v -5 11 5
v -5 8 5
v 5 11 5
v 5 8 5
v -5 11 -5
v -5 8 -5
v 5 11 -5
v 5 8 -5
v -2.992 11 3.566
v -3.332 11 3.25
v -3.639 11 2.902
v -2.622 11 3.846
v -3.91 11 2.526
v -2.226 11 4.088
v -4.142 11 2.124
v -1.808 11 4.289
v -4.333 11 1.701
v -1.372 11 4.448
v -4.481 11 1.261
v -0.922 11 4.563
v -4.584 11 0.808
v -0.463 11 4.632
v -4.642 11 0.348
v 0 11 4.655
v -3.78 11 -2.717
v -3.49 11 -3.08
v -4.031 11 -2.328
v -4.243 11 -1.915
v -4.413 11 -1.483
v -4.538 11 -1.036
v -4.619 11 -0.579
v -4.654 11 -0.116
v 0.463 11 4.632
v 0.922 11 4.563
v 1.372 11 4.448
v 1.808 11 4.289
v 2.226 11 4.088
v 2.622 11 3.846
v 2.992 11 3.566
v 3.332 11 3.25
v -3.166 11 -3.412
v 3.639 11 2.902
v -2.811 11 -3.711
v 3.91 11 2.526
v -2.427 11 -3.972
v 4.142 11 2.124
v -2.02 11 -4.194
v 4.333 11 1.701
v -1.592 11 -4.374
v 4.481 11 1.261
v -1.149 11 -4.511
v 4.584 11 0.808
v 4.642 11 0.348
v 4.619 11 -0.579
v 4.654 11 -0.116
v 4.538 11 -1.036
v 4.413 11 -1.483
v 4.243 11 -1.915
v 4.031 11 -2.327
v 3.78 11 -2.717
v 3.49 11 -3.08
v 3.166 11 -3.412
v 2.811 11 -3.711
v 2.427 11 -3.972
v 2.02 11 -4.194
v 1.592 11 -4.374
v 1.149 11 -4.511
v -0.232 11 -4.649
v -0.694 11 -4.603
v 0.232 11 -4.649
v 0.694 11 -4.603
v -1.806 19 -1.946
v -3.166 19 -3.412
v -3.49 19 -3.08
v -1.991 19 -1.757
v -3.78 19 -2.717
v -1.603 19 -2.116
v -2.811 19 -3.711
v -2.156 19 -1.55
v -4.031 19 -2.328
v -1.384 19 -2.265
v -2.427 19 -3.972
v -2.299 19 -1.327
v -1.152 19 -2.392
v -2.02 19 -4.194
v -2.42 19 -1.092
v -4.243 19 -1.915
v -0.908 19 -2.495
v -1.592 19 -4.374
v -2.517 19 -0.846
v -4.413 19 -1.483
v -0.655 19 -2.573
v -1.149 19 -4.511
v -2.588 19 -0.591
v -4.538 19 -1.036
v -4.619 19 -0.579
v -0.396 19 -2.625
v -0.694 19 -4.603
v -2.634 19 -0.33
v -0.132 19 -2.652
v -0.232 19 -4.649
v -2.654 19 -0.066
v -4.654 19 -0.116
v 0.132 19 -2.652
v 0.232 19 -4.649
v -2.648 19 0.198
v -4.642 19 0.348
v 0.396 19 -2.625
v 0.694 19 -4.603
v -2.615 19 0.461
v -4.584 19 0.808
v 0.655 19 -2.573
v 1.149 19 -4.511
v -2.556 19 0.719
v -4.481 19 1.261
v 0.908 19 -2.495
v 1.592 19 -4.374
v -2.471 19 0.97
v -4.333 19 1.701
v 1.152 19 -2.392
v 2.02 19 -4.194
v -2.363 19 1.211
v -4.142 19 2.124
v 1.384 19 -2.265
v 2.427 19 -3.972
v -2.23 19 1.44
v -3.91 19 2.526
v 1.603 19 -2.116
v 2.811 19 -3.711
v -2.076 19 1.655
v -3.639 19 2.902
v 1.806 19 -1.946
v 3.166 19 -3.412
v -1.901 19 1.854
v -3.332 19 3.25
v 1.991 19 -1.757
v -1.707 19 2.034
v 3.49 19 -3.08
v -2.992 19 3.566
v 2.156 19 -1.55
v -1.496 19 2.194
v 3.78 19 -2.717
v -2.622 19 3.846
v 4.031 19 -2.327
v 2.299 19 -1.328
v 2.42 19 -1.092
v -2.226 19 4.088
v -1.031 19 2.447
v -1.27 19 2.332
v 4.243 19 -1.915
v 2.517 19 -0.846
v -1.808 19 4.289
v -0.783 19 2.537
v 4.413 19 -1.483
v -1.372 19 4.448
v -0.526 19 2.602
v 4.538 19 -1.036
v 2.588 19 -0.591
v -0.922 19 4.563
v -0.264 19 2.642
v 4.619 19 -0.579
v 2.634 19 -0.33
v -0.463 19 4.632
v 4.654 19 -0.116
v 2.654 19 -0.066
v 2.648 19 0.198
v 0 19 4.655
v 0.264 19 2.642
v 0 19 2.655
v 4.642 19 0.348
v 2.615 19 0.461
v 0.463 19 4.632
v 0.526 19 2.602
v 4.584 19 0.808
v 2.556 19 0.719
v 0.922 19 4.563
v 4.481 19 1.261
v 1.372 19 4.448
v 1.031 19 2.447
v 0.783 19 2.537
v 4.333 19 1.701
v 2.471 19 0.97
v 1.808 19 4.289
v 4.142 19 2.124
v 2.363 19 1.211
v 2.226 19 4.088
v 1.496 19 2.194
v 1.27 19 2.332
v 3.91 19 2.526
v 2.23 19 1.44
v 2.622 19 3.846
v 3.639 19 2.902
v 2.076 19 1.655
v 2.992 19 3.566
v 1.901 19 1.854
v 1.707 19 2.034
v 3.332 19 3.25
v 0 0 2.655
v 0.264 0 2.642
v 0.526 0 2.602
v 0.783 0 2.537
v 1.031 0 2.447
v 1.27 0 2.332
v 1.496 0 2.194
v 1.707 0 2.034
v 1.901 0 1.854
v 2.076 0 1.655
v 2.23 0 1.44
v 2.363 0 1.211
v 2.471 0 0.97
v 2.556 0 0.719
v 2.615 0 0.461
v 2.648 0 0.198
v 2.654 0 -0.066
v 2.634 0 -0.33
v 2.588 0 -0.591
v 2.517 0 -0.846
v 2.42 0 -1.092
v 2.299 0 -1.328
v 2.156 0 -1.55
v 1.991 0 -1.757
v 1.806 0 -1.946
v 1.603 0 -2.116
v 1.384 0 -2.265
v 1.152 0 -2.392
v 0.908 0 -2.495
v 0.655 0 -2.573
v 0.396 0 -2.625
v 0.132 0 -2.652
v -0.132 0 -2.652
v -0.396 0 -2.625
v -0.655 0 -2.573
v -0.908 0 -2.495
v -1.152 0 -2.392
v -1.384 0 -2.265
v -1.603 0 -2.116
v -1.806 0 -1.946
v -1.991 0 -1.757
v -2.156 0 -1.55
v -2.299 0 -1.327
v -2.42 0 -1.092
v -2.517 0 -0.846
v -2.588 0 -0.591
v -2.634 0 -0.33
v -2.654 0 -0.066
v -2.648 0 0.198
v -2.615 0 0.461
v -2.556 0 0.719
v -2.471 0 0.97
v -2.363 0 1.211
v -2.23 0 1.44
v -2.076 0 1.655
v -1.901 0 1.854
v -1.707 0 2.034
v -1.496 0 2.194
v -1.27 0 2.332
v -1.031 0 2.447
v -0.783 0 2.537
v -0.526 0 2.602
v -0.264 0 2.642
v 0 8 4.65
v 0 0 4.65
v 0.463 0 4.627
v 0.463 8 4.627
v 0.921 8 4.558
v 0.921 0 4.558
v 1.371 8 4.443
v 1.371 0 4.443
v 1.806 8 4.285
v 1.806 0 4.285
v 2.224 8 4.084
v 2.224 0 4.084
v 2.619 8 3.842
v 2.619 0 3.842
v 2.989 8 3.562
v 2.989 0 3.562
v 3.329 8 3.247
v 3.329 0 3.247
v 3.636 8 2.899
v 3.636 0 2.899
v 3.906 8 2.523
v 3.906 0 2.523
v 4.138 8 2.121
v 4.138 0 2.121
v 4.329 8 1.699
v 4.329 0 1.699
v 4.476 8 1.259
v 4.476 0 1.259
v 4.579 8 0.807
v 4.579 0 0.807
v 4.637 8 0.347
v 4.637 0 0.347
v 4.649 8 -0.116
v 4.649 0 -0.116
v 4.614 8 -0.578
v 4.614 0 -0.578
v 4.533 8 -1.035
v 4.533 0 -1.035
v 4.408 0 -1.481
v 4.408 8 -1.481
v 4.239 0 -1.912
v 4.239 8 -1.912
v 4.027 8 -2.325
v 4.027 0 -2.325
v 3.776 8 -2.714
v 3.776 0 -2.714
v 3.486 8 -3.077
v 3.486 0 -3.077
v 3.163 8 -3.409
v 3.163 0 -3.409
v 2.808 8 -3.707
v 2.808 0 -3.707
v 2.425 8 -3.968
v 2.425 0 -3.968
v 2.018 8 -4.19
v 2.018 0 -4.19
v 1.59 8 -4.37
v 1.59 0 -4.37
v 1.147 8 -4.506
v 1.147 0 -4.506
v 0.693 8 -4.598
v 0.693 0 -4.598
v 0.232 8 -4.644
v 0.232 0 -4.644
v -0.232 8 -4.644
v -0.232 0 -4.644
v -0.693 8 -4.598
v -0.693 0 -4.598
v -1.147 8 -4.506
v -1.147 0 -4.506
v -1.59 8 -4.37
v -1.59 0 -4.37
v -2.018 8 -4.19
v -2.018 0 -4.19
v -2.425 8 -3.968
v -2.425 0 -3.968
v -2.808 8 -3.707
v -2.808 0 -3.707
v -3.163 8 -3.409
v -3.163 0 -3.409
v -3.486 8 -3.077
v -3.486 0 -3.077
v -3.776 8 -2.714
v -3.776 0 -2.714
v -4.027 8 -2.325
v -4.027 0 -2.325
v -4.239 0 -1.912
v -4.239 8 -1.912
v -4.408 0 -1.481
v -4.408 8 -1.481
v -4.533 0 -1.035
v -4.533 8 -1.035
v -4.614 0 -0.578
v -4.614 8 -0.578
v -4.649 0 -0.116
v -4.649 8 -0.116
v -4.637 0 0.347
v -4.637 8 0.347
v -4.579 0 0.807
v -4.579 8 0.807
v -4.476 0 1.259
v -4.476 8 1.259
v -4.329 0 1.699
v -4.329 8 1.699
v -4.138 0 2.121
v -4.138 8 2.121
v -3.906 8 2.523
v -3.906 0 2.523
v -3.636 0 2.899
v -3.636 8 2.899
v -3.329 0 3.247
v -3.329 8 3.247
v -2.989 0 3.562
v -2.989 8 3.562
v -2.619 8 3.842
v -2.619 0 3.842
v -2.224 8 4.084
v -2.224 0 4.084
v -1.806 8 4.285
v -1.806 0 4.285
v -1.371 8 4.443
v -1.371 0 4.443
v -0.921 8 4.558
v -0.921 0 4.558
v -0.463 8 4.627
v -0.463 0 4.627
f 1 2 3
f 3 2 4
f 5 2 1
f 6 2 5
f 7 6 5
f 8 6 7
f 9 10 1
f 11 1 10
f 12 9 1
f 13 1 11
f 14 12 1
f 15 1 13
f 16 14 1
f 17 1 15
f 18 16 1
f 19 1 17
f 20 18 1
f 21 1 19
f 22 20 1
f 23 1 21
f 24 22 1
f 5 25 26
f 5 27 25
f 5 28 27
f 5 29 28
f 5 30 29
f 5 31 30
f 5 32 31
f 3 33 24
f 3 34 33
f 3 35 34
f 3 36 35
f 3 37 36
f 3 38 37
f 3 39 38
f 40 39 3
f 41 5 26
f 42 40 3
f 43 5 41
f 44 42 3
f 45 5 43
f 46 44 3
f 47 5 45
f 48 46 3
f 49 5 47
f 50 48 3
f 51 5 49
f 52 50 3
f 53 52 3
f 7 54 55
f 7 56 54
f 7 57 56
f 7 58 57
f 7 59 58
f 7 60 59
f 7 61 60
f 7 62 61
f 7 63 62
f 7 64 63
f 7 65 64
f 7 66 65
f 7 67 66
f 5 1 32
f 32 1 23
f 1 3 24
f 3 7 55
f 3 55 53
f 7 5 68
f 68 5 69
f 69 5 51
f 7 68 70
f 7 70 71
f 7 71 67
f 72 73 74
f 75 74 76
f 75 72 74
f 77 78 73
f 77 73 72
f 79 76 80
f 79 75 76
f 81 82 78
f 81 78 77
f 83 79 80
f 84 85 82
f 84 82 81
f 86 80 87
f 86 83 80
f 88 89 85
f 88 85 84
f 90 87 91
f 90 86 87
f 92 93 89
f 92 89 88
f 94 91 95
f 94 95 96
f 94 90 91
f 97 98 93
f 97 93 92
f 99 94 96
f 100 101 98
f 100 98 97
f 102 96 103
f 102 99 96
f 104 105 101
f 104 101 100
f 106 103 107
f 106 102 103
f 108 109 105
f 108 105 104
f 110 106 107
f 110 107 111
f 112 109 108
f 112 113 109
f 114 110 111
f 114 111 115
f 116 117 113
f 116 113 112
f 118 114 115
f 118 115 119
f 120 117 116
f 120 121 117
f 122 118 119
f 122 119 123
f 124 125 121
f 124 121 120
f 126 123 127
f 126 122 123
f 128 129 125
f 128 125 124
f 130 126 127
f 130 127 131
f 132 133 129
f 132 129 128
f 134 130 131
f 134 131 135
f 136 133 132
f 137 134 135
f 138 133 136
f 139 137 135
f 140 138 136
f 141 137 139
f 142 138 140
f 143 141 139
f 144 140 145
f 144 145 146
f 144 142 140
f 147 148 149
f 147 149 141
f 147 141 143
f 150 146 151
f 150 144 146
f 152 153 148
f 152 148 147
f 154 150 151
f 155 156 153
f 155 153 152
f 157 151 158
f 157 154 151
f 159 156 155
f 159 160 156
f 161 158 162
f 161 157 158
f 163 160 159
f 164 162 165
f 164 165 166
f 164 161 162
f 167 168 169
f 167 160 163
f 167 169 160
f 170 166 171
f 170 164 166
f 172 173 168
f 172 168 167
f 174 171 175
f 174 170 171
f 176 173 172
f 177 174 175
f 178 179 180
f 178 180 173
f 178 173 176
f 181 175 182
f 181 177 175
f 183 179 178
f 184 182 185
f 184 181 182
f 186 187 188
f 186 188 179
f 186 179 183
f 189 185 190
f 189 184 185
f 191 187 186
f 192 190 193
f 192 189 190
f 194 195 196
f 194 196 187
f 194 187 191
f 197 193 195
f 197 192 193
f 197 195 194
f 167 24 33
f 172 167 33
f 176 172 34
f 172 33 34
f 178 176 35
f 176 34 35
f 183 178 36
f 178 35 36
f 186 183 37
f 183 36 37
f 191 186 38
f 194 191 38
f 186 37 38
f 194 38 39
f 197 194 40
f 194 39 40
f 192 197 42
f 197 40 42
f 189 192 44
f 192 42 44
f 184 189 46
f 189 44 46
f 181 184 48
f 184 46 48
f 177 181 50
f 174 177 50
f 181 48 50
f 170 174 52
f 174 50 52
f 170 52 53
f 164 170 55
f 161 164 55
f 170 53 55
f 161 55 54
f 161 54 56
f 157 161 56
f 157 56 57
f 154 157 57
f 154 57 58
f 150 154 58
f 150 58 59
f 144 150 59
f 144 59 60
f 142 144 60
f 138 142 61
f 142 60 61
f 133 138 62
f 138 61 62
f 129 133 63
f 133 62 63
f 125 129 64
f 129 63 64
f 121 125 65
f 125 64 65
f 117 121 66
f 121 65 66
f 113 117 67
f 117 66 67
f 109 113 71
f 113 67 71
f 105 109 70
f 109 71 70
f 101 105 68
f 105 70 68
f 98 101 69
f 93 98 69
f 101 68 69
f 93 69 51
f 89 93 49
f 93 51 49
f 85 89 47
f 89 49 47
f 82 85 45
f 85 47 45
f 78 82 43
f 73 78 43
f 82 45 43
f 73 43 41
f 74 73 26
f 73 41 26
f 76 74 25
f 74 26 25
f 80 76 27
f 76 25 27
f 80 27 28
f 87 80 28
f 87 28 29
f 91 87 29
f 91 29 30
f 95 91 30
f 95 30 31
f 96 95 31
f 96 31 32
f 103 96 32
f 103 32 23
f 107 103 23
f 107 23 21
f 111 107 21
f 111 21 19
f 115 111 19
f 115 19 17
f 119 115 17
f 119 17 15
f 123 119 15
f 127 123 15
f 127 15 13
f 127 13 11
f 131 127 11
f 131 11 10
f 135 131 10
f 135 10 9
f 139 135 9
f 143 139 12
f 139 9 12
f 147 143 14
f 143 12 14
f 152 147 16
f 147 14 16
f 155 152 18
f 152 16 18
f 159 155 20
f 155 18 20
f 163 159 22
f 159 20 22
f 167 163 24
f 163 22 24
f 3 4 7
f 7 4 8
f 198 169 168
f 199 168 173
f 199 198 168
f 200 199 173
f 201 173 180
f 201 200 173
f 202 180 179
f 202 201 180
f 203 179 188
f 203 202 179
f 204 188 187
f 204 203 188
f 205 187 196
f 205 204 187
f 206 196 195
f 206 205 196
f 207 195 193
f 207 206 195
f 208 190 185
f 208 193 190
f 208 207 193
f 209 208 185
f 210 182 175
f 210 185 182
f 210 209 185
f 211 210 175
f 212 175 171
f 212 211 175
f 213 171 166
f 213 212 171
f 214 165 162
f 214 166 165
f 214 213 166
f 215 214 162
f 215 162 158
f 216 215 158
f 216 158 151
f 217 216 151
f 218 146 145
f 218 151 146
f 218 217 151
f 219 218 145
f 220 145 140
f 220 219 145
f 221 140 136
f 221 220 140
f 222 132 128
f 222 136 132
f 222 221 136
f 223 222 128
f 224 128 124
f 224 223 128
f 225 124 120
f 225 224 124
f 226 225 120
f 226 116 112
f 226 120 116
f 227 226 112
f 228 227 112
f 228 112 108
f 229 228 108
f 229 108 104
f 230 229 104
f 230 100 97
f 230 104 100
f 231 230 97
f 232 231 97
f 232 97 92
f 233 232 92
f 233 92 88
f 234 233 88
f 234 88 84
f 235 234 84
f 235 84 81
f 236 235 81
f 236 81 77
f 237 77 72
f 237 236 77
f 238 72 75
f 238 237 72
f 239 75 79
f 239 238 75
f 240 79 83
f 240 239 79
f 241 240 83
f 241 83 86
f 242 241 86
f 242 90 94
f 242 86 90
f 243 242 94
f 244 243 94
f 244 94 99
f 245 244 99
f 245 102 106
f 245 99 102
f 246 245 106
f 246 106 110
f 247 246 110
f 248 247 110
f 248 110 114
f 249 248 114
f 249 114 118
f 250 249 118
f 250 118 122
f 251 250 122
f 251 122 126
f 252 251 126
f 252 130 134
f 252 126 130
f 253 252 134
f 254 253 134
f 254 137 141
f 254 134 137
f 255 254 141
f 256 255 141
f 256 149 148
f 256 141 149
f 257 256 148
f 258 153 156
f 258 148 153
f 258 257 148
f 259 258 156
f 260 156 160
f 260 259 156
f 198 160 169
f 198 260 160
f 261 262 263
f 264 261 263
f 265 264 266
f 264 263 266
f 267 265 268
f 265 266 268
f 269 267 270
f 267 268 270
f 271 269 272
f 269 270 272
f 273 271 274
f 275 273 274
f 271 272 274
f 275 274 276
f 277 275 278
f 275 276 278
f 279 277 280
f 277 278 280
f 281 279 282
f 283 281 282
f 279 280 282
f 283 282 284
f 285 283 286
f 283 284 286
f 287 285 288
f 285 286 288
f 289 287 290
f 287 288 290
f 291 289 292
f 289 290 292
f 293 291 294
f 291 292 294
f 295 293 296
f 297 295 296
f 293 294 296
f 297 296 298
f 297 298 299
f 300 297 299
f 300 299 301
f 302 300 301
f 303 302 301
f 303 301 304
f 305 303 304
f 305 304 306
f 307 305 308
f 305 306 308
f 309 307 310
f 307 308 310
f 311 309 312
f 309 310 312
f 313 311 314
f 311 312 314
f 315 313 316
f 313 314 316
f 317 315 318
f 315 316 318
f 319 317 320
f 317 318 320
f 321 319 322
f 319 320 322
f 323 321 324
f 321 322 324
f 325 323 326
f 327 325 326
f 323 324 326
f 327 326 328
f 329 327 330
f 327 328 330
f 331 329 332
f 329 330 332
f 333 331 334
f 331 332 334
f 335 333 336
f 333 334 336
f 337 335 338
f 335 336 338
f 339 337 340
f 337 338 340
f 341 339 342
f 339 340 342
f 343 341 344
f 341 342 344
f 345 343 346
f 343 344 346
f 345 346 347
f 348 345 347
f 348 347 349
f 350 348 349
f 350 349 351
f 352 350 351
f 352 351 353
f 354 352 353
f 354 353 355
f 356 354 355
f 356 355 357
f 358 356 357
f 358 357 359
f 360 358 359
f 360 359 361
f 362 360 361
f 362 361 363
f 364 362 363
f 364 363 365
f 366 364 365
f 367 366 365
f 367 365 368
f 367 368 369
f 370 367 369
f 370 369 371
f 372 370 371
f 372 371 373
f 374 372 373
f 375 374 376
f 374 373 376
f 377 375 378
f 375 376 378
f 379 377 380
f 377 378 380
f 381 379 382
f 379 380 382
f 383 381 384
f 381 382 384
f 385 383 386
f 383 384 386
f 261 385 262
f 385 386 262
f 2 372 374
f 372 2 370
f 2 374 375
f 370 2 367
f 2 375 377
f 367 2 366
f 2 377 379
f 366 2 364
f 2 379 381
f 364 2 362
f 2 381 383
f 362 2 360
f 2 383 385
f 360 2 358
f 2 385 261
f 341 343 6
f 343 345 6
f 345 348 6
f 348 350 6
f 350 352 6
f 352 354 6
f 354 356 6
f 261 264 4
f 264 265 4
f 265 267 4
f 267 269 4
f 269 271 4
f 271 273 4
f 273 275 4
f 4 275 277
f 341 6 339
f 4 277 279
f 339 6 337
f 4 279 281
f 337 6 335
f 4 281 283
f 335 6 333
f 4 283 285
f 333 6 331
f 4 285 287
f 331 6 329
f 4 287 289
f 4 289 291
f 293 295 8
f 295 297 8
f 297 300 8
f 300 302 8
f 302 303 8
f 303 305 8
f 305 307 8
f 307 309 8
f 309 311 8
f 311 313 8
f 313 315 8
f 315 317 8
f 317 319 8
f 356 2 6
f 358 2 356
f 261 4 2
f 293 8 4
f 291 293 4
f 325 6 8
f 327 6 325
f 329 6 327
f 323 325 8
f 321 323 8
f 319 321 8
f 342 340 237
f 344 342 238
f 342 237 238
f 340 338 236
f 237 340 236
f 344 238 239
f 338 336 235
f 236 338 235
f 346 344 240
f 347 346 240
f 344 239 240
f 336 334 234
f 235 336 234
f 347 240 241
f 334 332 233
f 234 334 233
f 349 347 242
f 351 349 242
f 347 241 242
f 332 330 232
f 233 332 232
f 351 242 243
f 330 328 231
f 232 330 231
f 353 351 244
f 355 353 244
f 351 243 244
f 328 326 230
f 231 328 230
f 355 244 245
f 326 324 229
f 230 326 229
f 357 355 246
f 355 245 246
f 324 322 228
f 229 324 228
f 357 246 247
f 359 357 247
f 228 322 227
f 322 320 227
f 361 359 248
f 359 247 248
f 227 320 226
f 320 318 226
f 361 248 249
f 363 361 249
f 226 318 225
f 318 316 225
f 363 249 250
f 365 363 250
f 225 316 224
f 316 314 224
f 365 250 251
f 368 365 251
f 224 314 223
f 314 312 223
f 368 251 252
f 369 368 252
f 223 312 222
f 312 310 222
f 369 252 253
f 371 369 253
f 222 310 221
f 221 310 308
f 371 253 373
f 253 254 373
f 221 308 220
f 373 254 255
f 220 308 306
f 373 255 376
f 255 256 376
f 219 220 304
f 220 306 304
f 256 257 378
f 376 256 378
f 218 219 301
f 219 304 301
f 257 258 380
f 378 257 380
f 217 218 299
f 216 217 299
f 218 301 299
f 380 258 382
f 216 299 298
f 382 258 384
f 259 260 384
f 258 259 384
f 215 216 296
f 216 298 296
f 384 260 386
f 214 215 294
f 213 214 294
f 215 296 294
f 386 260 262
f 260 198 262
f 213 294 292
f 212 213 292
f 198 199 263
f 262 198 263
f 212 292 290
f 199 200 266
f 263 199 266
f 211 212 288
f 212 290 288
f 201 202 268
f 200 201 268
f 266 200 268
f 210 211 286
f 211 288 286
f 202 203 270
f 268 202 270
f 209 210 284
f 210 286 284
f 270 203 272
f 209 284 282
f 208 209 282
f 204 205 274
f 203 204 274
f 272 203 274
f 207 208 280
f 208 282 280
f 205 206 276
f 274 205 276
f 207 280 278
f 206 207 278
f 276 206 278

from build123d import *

# Parameters (mm, degrees)
SKETCH1_R               = 4.65
BOSS_EXTRUDE1_DEPTH     = 8
SKETCH2_W               = 10
SKETCH2_H               = 10
BOSS_EXTRUDE2_DEPTH     = 3
SKETCH3_R               = 4.655
BOSS_EXTRUDE3_DEPTH     = 8
CUT_EXTRUDE1_DEPTH      = 21.273134933
CUT_EXTRUDE1_DEPTH_BACK = 21.273134933
SKETCH4_R               = 2.655


with BuildPart() as part:
    # Sketch1 → Boss-Extrude1 (new body)
    with BuildSketch(Plane(origin=(0, 0, 0), x_dir=(1, 0, 0), z_dir=(0, 1, 0))):
        with Locations(Location((0, 0, 0), (0, 0, 270))):
            Circle(SKETCH1_R)
    extrude(amount=BOSS_EXTRUDE1_DEPTH)

    # Sketch2 → Boss-Extrude2 (add)
    with BuildSketch(Plane(origin=(0, 8, 0), x_dir=(1, 0, 0), z_dir=(0, 1, 0))):
        Rectangle(SKETCH2_W, SKETCH2_H)
    extrude(amount=BOSS_EXTRUDE2_DEPTH)

    # Sketch3 → Boss-Extrude3 (add)
    with BuildSketch(Plane(origin=(0, 11, 0), x_dir=(1, 0, 0), z_dir=(0, 1, 0))):
        with Locations(Location((0, 0, 0), (0, 0, 270))):
            Circle(SKETCH3_R)
    extrude(amount=BOSS_EXTRUDE3_DEPTH)

    # Sketch4 → Cut-Extrude1 (cut, two sides: drawn at the far end of the back side and taken through both)
    with BuildSketch(Plane(origin=(0, 19, 0), x_dir=(1, 0, 0), z_dir=(0, 1, 0)).offset(-CUT_EXTRUDE1_DEPTH_BACK)):
        with Locations(Location((0, 0, 0), (0, 0, 270))):
            Circle(SKETCH4_R)
    extrude(amount=CUT_EXTRUDE1_DEPTH + CUT_EXTRUDE1_DEPTH_BACK, mode=Mode.SUBTRACT)


solid = part.part
